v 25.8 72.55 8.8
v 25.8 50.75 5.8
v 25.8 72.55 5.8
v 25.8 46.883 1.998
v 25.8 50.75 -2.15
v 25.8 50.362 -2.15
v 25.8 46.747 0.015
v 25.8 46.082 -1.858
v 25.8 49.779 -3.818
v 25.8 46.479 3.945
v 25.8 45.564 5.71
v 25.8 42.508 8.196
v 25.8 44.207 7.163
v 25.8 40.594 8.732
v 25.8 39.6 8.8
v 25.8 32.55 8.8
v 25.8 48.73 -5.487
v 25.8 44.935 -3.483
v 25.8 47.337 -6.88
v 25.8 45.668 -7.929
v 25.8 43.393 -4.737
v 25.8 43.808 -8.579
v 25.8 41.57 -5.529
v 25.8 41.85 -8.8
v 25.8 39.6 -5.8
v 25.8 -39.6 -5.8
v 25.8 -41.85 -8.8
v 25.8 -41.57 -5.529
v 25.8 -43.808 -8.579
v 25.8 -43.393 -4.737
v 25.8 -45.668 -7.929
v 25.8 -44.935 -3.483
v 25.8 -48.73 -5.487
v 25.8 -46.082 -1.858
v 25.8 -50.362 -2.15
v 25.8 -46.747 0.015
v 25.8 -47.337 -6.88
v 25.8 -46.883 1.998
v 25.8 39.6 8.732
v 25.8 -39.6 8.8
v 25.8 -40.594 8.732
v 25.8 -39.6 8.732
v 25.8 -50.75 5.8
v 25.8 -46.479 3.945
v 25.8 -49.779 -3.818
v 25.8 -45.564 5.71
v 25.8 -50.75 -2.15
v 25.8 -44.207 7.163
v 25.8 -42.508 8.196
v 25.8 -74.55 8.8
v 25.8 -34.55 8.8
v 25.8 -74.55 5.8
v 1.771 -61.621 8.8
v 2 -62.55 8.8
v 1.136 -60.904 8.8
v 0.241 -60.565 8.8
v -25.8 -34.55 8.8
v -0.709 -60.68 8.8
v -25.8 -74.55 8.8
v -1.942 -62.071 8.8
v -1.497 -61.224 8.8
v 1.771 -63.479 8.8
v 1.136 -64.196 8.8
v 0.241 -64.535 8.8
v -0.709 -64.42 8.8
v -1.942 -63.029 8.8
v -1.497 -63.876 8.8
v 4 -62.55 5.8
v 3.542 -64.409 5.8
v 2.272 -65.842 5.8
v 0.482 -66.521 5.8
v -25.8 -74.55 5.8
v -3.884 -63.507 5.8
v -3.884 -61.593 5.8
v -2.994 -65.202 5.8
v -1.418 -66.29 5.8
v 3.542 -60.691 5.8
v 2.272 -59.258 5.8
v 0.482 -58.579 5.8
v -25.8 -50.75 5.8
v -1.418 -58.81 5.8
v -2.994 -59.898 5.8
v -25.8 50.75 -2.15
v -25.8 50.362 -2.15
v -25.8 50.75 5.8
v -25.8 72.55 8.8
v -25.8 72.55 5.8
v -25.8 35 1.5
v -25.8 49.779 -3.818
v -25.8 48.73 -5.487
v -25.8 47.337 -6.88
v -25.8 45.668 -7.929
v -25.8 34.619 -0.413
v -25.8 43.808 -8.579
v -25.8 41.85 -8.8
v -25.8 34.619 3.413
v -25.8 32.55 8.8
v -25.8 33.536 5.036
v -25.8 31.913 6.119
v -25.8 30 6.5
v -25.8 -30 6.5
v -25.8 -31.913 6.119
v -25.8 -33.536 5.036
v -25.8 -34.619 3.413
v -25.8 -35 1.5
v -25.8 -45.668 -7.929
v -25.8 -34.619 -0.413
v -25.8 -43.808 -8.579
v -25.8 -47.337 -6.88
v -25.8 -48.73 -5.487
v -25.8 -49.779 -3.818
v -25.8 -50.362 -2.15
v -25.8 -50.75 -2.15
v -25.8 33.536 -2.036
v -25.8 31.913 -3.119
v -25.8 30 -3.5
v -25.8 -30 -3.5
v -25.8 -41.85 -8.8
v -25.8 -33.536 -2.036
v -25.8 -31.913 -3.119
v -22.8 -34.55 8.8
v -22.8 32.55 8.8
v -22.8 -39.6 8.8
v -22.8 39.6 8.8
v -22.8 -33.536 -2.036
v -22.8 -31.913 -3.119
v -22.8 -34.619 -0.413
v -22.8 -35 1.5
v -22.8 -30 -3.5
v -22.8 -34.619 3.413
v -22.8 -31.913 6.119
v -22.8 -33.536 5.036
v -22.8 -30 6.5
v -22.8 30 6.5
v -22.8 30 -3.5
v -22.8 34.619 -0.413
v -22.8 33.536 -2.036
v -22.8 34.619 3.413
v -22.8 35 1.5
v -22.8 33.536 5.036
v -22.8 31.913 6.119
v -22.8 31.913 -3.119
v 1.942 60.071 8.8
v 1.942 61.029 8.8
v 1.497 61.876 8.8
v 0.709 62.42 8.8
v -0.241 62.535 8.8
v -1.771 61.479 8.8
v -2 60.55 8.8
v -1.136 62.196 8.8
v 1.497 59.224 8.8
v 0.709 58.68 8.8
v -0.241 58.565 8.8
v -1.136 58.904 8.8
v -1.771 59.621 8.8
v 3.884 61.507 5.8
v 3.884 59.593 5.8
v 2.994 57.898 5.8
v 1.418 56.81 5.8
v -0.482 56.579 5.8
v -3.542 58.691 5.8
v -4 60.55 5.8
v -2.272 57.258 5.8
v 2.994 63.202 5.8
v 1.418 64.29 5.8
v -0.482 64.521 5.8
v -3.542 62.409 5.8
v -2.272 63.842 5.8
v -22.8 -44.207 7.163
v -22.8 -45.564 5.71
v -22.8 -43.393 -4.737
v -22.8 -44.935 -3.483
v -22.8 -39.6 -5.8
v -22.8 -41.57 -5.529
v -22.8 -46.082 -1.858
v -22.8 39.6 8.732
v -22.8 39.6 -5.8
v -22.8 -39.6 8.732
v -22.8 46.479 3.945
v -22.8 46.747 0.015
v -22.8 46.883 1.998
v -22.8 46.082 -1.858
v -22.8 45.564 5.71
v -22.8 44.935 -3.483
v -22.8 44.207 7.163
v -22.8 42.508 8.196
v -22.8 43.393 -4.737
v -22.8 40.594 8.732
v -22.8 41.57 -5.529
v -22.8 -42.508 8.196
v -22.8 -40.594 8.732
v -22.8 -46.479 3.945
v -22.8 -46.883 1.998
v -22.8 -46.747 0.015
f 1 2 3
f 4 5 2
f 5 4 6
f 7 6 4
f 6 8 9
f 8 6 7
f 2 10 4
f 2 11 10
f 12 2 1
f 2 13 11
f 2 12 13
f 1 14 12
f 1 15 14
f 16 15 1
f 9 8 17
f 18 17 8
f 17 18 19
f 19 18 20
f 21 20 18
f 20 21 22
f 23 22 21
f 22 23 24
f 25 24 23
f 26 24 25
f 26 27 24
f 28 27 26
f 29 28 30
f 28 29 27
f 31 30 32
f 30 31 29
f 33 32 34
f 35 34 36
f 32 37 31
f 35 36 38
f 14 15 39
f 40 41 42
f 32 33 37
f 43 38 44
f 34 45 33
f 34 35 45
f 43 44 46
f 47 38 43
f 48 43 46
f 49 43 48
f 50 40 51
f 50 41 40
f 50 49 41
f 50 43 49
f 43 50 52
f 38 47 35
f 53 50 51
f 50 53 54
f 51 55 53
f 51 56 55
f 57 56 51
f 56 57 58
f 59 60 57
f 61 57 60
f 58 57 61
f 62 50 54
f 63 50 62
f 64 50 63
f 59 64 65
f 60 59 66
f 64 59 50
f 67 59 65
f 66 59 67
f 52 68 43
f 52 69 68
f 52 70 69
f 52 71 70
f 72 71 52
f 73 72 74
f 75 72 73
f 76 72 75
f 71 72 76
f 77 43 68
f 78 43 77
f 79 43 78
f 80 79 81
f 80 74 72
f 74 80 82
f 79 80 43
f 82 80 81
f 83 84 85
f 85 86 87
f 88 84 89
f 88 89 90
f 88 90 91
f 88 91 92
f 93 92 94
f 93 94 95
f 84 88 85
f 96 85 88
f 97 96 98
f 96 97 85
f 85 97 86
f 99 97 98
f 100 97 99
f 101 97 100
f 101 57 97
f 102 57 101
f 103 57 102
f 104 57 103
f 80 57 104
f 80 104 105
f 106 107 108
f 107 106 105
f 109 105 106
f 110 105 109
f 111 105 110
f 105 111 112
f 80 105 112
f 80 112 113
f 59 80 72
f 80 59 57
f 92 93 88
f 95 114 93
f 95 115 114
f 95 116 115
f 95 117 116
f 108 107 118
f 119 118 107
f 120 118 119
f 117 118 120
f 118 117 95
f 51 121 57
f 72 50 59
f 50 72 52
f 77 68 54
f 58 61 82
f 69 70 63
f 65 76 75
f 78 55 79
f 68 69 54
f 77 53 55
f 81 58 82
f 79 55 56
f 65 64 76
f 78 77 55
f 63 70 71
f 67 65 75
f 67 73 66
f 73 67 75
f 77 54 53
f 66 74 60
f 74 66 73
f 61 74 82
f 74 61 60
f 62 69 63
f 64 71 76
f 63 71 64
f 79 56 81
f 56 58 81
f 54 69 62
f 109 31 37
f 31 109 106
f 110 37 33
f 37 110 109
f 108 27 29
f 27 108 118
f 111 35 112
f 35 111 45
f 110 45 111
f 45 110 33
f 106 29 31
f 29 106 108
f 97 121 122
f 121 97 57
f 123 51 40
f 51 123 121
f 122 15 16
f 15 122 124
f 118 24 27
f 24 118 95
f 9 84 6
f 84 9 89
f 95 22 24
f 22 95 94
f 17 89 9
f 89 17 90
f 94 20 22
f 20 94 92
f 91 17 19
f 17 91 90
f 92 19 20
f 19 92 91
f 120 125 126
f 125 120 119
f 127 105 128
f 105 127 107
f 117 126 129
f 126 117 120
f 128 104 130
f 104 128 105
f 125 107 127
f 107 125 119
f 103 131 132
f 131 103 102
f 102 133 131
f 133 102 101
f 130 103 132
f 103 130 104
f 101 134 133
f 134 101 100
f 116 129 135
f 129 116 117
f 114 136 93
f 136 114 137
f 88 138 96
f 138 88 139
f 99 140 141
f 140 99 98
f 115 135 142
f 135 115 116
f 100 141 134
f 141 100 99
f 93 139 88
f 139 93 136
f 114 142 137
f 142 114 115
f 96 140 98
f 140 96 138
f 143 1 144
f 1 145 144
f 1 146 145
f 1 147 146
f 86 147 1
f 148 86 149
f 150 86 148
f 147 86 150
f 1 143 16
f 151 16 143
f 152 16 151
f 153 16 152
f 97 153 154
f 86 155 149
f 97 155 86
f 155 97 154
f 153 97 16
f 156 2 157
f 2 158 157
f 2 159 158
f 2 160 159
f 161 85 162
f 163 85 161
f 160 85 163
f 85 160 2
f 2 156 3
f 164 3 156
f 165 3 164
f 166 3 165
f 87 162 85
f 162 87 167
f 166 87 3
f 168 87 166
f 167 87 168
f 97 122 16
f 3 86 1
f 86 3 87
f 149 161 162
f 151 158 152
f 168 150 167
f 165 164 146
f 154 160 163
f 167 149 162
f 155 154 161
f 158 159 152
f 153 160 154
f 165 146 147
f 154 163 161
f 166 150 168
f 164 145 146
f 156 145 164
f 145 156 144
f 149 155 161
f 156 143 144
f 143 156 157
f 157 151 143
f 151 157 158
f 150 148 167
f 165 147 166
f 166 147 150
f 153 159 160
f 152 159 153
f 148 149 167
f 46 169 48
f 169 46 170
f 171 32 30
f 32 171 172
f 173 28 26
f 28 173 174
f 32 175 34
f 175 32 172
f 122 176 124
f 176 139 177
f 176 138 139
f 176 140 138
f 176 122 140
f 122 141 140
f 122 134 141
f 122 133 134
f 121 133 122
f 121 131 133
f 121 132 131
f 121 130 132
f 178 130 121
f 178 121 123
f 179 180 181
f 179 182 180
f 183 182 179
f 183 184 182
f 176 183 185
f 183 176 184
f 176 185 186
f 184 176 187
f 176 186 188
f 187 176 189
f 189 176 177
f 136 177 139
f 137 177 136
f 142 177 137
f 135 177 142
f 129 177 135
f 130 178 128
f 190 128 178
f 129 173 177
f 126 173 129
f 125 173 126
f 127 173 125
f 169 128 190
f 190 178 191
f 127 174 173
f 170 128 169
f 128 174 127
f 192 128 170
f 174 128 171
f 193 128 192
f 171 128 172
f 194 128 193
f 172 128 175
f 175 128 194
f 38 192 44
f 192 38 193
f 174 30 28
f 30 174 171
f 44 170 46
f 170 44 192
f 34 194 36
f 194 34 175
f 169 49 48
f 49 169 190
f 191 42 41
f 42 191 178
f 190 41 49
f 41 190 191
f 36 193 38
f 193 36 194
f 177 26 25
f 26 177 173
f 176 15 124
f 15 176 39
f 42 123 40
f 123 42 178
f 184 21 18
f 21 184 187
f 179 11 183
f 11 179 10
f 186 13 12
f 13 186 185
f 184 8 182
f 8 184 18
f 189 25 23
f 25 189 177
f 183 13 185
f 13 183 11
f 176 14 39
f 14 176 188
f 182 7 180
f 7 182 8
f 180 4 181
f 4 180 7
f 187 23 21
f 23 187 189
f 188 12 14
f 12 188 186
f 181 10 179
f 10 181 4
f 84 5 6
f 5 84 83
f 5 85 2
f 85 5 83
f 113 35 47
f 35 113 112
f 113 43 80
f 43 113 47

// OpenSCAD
apparaatHoogte = 14.6;
apparaatDiepte = 48.6;
apparaatBreedte = 86.5;
wandDikte = 3;
openingHoogte = 10;
openingBreedte = 65;
bevestigingBreedte = 40;
bevestigingDikte = 3;
schroefGatDikte = 4;

module kastVorm(hoogte, diepte, breedte) {
    translate([0,-(breedte-hoogte/2)/2,0])
        rotate([0,90,0])
            cylinder(h=diepte,d=hoogte, center=true);
    translate([-diepte/2,-(breedte-hoogte/2)/2,-hoogte/2])
        cube([diepte,breedte-hoogte/2,hoogte]);
    translate([0,(breedte-hoogte/2)/2,0])
        rotate([0,90,0])
            cylinder(h=diepte,d=hoogte, center=true);
}

module schroefgat(schroefmaat, schroeflengte) {
    cylinder(h = schroeflengte, d1 = schroefmaat*2, d2 = schroefmaat);
}

module bevestiging(hoogte, breedte, diepte, dikte, schroefmaat) {
    color("red",0.25)
    difference() {
        cube([hoogte, breedte, dikte], center=true);
        translate([0,schroefmaat*3-breedte/2,-dikte/2])
            schroefgat(schroefmaat, dikte);
    }
}

module opvulling() {
//    color("green",0.25)
    cube([apparaatDiepte+wandDikte, wandDikte, apparaatHoogte/2+wandDikte], center=true);
}
module montageKast() {
    union() {
        translate([0,apparaatBreedte/2+wandDikte*2,bevestigingDikte])
            opvulling();
        difference() {
            union() {
                translate([0,-1*((apparaatBreedte+apparaatHoogte)/2)-schroefGatDikte/1,apparaatHoogte/2])
                    bevestiging(apparaatDiepte+wandDikte,bevestigingBreedte,wandDikte, bevestigingDikte, schroefGatDikte);  
                difference() {
                    kastVorm(apparaatHoogte+wandDikte, apparaatDiepte+wandDikte, apparaatBreedte+2*wandDikte);
                    translate([0,0,wandDikte/2])
                        kastVorm(openingHoogte, apparaatDiepte+wandDikte, openingBreedte);
                }
                rotate([0,0,180])
                    translate([0,-1*((apparaatBreedte+apparaatHoogte)/2)-schroefGatDikte/2,apparaatHoogte/2])
                        bevestiging(apparaatDiepte+wandDikte,bevestigingBreedte,wandDikte, bevestigingDikte, schroefGatDikte);  
            }
            color("blue", 0.25)
            translate([wandDikte, 0, wandDikte/2])
                kastVorm(apparaatHoogte, apparaatDiepte+wandDikte, apparaatBreedte);
        }
        translate([0,-1*(apparaatBreedte/2+wandDikte*2),bevestigingDikte])
            opvulling();
    }
}

montageKast();
//bevestiging(apparaatDiepte,bevestigingBreedte,wandDikte, bevestigingDikte, schroefGatDikte);
//schroefgat(schroefGatDikte, bevestigingDikte);
